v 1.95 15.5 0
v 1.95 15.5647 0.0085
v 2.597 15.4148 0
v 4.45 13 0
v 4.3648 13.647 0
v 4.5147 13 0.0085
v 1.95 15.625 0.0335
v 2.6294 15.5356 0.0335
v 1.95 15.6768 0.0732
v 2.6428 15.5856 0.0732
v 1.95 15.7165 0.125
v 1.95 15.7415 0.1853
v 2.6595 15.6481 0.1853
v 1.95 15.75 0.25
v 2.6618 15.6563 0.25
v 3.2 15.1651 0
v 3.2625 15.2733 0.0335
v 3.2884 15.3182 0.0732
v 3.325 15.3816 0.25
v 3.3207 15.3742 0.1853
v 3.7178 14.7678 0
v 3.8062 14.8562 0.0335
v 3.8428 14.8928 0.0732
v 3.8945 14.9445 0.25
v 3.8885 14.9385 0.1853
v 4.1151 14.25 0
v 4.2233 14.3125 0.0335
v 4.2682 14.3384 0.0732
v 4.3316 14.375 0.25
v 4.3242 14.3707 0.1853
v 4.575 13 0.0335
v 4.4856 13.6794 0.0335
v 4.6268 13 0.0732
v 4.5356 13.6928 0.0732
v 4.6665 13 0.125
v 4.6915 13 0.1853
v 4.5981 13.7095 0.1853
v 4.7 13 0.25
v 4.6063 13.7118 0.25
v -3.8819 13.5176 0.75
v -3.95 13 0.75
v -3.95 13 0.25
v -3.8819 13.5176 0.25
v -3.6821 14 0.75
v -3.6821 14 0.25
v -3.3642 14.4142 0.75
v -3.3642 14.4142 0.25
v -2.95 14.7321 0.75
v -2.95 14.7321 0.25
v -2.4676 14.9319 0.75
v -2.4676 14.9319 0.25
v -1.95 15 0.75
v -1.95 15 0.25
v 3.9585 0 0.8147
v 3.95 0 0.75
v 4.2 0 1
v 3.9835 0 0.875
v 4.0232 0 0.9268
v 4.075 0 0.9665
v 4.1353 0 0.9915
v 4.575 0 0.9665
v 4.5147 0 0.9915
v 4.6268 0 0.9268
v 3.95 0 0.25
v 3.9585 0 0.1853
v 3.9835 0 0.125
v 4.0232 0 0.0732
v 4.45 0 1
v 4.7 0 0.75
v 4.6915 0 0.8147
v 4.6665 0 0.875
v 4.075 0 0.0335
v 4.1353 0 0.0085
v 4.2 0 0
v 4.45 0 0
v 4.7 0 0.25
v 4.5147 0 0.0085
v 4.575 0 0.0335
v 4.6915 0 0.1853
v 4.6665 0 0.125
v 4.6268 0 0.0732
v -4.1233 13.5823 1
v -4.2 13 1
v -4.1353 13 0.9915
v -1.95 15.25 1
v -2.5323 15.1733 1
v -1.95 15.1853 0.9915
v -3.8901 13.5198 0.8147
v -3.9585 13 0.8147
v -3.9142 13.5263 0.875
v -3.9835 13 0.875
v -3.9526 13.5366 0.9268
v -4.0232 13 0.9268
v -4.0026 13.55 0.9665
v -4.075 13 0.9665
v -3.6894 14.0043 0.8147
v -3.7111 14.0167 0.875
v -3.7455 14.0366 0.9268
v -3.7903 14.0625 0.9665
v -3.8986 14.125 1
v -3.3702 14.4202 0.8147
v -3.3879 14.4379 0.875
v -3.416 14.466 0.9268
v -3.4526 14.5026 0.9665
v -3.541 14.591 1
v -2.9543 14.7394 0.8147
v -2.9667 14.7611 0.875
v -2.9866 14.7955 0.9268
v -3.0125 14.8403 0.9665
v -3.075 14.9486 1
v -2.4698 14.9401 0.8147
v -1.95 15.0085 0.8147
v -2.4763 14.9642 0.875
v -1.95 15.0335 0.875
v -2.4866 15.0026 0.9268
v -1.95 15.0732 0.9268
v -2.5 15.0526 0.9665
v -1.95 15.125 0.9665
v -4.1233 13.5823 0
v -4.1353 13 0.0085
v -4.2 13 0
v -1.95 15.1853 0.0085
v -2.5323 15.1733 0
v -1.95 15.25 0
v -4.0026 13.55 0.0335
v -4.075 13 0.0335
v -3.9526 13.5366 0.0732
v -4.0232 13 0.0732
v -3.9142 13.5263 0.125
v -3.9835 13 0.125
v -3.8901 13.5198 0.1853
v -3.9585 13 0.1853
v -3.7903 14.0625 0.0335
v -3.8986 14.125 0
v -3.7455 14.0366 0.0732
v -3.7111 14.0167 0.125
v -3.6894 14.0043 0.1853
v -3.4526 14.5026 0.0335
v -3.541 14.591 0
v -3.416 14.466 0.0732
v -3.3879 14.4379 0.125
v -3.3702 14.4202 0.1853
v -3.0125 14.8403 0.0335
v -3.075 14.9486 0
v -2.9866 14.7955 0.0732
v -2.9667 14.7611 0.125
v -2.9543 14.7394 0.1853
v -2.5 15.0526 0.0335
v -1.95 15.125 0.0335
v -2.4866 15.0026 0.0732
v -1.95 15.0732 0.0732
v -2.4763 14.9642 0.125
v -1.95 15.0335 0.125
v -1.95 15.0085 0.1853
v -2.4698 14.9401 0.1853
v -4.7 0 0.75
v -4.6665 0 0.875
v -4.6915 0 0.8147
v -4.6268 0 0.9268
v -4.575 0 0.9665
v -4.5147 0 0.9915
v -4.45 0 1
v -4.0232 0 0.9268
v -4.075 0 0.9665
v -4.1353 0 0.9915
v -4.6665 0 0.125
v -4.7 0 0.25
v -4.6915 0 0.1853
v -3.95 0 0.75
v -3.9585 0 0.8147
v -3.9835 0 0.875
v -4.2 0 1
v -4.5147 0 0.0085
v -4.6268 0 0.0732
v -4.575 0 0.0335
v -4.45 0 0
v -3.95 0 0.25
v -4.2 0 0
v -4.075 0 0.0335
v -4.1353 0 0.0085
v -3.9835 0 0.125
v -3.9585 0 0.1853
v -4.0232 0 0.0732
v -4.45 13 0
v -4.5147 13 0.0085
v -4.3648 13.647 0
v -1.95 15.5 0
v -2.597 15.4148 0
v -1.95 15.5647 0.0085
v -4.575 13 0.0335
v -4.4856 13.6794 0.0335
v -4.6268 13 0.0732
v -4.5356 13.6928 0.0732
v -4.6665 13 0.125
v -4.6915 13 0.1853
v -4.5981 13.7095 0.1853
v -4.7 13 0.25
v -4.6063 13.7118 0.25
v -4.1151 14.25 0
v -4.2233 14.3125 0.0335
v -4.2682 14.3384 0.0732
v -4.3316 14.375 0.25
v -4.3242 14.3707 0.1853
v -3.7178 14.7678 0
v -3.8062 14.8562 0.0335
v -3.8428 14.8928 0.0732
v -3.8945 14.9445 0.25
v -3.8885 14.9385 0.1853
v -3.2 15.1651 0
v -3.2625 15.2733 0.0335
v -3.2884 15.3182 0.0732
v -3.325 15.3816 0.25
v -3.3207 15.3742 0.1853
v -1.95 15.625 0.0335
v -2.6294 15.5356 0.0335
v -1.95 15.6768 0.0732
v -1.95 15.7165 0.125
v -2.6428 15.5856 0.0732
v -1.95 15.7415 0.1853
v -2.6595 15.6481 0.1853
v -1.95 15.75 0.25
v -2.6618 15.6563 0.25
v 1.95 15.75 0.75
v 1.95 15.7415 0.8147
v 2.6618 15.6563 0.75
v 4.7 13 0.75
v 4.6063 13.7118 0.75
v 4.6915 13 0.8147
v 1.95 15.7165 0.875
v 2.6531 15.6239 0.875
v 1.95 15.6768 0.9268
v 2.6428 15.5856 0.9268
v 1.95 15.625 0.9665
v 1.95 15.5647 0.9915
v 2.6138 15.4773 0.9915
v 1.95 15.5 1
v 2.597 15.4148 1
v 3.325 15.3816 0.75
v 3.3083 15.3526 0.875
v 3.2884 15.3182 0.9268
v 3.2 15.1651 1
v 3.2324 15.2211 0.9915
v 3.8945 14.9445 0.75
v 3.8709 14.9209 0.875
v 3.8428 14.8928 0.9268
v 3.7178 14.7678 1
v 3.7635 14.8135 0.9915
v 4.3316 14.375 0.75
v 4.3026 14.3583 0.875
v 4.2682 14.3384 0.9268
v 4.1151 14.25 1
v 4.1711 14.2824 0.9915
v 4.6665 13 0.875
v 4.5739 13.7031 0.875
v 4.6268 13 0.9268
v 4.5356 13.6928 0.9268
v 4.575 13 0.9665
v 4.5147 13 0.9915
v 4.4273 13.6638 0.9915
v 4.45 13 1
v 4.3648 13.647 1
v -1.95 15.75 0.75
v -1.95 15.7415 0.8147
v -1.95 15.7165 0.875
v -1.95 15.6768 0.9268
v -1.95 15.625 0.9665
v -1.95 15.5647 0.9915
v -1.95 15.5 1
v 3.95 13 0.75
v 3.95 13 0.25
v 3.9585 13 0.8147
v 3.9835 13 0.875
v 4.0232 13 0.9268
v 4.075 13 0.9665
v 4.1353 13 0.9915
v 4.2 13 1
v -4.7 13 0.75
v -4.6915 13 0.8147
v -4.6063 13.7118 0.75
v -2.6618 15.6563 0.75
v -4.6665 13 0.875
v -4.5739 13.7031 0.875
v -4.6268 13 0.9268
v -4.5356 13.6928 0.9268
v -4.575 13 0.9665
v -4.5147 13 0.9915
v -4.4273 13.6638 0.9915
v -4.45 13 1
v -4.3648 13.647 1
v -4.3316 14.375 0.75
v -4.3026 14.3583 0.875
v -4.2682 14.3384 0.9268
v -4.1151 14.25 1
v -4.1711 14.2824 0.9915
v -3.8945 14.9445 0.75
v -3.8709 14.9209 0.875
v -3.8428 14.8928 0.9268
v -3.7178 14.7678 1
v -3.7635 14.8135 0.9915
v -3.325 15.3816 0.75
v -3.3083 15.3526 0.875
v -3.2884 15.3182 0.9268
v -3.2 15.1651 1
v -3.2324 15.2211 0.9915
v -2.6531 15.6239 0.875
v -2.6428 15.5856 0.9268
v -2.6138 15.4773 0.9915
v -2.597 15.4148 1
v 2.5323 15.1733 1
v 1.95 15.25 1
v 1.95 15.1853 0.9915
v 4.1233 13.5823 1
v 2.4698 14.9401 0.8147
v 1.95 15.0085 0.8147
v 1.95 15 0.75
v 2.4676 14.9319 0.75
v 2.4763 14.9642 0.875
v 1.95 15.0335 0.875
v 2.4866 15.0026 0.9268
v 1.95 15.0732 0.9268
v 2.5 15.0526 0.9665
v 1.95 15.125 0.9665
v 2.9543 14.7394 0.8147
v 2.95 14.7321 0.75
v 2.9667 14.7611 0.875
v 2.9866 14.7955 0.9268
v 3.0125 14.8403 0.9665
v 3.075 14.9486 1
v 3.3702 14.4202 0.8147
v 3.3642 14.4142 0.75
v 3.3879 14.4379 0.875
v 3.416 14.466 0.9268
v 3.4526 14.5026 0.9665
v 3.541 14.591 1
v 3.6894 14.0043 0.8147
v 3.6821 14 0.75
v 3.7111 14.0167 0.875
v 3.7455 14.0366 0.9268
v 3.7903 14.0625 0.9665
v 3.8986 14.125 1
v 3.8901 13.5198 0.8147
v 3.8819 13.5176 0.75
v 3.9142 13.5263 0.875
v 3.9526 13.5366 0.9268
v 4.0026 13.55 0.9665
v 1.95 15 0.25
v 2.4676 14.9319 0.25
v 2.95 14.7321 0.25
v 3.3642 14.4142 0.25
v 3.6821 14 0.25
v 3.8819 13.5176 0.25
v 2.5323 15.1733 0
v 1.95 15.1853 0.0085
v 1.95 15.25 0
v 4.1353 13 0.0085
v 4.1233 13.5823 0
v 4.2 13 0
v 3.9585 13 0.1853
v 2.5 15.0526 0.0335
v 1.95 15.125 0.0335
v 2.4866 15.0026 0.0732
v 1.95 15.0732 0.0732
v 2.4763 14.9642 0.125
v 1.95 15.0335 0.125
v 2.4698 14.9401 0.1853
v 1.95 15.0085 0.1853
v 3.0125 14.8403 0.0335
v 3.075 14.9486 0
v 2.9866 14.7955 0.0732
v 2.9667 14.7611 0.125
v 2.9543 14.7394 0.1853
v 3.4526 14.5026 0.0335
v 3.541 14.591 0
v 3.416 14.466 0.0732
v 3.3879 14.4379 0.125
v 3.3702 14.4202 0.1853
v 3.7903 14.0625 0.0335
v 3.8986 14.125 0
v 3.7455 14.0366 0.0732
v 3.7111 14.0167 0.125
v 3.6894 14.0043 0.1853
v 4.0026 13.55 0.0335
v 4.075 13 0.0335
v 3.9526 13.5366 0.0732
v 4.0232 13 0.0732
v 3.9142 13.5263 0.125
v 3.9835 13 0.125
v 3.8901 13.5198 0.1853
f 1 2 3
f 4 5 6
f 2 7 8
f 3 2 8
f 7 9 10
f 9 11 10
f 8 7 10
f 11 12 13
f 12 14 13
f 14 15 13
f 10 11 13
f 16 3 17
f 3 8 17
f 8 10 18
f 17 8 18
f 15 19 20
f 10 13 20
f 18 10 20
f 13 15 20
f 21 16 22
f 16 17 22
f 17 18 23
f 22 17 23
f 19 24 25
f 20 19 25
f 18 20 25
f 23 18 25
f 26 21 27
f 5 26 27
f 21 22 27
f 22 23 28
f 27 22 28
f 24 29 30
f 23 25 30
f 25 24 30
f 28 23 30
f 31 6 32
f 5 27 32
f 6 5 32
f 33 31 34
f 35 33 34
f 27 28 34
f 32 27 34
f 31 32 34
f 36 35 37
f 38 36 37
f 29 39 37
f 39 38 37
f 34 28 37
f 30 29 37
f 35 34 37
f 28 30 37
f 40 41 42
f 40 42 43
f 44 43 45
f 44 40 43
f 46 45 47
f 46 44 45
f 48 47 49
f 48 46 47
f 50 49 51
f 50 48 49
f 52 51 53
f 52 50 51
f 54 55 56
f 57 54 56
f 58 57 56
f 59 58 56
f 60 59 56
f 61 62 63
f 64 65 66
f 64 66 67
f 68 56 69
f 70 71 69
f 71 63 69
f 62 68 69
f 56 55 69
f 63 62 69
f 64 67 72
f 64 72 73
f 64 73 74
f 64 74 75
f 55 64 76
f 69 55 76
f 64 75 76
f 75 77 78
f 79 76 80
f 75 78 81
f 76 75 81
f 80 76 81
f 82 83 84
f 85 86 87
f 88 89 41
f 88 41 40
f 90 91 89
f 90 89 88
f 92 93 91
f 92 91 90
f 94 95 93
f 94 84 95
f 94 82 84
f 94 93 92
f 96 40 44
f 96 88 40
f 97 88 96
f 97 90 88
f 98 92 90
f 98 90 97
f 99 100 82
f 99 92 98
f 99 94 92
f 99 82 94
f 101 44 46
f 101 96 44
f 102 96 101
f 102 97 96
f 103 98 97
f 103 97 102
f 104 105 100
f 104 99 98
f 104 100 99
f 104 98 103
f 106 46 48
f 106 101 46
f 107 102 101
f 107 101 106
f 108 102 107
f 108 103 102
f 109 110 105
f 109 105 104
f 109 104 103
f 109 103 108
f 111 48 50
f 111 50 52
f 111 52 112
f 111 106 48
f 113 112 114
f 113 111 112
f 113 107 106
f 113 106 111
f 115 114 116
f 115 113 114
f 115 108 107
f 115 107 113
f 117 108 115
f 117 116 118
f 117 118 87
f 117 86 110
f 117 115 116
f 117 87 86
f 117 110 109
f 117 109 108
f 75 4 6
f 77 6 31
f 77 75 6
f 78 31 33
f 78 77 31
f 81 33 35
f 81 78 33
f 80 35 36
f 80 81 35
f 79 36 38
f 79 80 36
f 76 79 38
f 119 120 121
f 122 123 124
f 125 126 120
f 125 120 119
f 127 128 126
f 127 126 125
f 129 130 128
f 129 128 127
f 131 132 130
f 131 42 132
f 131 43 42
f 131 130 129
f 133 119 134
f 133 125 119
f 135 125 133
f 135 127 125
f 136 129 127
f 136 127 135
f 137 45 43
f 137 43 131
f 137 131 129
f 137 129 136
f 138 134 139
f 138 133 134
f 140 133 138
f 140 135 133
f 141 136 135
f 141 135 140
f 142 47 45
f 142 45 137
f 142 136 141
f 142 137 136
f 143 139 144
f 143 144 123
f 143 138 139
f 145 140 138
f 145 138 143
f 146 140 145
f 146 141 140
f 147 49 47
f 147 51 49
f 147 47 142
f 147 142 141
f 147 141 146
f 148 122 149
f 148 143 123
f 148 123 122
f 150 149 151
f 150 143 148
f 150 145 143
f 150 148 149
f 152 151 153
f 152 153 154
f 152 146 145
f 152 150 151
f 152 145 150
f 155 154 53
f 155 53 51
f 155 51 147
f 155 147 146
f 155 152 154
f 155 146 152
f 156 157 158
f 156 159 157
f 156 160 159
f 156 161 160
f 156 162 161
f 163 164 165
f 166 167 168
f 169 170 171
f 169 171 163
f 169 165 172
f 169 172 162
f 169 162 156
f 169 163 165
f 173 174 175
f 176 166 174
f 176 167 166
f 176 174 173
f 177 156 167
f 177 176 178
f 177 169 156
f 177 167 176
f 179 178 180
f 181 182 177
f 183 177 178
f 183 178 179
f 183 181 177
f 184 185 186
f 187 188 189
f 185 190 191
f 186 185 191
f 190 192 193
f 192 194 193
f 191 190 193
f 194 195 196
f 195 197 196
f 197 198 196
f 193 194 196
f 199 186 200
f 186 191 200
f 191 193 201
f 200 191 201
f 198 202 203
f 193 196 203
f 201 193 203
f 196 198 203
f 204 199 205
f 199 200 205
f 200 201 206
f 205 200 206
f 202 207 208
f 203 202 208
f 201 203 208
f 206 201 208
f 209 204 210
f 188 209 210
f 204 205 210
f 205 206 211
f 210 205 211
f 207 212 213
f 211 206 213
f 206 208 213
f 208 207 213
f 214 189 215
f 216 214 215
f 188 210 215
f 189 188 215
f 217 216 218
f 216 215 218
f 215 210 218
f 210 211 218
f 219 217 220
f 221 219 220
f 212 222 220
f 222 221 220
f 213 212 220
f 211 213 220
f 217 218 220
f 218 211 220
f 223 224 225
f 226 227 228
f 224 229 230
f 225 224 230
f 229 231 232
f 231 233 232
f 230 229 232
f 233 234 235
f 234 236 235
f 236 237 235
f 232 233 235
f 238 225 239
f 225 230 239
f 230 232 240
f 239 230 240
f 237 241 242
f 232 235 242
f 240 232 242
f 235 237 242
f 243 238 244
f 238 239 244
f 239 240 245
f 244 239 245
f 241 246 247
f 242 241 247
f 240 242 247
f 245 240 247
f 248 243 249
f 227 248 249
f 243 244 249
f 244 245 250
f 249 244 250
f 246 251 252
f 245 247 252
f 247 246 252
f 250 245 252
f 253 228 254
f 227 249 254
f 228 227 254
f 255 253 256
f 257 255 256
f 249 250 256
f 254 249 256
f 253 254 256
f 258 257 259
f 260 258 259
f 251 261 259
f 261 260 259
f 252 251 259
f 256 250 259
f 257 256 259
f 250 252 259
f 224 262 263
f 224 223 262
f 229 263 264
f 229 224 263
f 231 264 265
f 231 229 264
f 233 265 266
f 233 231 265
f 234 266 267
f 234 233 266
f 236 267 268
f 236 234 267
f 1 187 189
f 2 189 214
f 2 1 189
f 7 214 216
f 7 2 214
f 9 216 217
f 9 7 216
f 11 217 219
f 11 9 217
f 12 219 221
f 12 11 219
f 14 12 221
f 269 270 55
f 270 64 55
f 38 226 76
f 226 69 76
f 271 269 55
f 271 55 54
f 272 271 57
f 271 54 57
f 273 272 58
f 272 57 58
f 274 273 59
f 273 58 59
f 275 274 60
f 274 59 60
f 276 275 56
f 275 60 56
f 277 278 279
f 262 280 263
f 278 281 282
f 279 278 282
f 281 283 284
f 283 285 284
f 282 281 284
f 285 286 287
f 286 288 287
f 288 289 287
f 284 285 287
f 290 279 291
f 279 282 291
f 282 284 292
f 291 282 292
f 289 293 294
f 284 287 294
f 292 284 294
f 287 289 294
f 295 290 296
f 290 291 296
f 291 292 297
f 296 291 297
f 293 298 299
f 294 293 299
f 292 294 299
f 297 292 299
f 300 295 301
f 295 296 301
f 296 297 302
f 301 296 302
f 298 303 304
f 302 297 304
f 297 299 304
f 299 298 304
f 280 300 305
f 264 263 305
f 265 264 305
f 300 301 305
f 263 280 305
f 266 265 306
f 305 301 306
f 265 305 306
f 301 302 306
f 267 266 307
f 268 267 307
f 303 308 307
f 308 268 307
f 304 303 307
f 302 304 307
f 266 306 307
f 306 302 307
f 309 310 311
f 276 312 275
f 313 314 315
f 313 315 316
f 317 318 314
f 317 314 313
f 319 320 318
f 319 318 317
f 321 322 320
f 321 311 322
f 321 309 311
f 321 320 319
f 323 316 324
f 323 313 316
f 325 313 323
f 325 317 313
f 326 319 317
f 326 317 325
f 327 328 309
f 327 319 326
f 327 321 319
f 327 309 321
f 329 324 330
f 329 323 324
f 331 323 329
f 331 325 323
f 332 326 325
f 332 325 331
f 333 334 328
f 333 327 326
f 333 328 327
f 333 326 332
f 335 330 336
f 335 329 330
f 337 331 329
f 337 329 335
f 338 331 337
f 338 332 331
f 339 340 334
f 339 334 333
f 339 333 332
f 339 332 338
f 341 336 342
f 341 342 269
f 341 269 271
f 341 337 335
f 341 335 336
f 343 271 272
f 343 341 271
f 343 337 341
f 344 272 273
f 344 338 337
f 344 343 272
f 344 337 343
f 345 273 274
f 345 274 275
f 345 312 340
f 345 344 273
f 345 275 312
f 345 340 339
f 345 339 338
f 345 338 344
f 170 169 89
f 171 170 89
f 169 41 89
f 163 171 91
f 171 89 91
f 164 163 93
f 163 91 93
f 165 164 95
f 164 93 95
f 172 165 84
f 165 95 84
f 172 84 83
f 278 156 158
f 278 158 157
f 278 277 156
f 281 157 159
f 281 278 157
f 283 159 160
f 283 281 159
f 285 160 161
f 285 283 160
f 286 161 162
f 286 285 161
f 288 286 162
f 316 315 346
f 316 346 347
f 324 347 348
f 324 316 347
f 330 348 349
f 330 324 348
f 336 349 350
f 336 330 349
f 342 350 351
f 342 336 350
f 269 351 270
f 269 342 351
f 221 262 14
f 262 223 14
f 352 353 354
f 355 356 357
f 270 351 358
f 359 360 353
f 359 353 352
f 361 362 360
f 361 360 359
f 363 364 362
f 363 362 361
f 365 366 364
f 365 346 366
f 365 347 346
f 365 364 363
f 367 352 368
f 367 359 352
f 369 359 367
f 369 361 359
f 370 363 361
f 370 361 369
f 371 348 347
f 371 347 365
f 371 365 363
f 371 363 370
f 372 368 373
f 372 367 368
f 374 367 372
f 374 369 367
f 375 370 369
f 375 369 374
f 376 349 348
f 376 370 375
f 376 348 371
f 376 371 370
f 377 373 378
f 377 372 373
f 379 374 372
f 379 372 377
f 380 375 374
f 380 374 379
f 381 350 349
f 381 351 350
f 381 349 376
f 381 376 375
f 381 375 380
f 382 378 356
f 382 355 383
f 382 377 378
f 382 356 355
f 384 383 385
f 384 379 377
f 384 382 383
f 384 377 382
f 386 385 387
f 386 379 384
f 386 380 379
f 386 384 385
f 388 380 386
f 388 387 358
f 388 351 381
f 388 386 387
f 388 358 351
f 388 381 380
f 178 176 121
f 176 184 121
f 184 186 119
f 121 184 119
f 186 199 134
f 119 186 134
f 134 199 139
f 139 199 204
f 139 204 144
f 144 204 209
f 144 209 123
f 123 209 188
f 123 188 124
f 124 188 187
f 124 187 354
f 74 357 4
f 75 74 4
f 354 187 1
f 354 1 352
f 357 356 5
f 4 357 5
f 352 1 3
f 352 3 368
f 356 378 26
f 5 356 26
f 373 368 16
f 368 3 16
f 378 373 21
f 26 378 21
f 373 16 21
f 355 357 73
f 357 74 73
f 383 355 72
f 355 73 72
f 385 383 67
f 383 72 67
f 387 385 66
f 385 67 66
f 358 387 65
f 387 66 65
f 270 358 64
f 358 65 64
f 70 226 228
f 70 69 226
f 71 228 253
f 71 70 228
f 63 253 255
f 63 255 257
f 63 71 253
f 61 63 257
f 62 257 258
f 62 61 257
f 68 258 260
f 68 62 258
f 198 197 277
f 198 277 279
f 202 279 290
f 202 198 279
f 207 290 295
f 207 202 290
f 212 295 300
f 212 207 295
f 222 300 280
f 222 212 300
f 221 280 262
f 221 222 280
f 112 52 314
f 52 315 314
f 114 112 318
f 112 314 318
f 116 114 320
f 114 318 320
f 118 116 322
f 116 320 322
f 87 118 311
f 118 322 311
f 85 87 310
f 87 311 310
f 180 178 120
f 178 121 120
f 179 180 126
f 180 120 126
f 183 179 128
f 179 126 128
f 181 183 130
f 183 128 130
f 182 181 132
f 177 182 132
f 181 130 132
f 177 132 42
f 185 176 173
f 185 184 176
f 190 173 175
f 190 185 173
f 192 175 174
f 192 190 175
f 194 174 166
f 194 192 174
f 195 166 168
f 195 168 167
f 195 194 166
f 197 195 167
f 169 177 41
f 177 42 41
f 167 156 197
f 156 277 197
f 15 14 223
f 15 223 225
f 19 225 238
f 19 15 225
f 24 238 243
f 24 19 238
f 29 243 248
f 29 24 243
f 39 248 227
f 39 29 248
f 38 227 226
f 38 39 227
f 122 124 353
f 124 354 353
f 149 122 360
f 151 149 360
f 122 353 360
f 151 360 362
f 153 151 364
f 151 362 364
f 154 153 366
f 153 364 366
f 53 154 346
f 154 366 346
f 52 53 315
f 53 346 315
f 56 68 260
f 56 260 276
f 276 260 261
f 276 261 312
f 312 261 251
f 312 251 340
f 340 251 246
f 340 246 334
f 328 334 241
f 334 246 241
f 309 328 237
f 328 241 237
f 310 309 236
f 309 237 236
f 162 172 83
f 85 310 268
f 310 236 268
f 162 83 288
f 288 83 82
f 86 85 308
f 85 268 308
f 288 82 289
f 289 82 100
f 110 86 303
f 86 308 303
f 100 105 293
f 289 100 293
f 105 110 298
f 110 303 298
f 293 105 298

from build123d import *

# Parameters (mm, degrees)
F1_W = 0.75
F1_H = 1
F3_R = 0.25


with BuildPart() as f2:
    # F2: sweep along a path in F0
    with BuildLine(Plane.XY) as f2_path:
        Line((-3.95, 0), (-3.95, 13))
        ThreePointArc((-3.95, 13), (-3.3642135624, 14.4142135624), (-1.95, 15))
        Line((-1.95, 15), (1.95, 15))
        ThreePointArc((1.95, 15), (3.3642135624, 14.4142135624), (3.95, 13))
        Line((3.95, 13), (3.95, 0))
    # F1 (on Front) → F2 (sweep)
    with BuildSketch(Plane.XZ):
        with Locations((-4.325, 0.5)):
            Rectangle(F1_W, F1_H)
    sweep(path=f2_path.line)

    # F3
    f3_edges = [f2.edges().sort_by_distance(p)[0] for p in [
        (-4.7, 6.5, 1),
        (-3.95, 6.5, 1),
        (3.95, 6.5, 0),
        (4.7, 6.5, 0),
    ]]
    fillet(f3_edges, radius=F3_R)


solid = f2.part
